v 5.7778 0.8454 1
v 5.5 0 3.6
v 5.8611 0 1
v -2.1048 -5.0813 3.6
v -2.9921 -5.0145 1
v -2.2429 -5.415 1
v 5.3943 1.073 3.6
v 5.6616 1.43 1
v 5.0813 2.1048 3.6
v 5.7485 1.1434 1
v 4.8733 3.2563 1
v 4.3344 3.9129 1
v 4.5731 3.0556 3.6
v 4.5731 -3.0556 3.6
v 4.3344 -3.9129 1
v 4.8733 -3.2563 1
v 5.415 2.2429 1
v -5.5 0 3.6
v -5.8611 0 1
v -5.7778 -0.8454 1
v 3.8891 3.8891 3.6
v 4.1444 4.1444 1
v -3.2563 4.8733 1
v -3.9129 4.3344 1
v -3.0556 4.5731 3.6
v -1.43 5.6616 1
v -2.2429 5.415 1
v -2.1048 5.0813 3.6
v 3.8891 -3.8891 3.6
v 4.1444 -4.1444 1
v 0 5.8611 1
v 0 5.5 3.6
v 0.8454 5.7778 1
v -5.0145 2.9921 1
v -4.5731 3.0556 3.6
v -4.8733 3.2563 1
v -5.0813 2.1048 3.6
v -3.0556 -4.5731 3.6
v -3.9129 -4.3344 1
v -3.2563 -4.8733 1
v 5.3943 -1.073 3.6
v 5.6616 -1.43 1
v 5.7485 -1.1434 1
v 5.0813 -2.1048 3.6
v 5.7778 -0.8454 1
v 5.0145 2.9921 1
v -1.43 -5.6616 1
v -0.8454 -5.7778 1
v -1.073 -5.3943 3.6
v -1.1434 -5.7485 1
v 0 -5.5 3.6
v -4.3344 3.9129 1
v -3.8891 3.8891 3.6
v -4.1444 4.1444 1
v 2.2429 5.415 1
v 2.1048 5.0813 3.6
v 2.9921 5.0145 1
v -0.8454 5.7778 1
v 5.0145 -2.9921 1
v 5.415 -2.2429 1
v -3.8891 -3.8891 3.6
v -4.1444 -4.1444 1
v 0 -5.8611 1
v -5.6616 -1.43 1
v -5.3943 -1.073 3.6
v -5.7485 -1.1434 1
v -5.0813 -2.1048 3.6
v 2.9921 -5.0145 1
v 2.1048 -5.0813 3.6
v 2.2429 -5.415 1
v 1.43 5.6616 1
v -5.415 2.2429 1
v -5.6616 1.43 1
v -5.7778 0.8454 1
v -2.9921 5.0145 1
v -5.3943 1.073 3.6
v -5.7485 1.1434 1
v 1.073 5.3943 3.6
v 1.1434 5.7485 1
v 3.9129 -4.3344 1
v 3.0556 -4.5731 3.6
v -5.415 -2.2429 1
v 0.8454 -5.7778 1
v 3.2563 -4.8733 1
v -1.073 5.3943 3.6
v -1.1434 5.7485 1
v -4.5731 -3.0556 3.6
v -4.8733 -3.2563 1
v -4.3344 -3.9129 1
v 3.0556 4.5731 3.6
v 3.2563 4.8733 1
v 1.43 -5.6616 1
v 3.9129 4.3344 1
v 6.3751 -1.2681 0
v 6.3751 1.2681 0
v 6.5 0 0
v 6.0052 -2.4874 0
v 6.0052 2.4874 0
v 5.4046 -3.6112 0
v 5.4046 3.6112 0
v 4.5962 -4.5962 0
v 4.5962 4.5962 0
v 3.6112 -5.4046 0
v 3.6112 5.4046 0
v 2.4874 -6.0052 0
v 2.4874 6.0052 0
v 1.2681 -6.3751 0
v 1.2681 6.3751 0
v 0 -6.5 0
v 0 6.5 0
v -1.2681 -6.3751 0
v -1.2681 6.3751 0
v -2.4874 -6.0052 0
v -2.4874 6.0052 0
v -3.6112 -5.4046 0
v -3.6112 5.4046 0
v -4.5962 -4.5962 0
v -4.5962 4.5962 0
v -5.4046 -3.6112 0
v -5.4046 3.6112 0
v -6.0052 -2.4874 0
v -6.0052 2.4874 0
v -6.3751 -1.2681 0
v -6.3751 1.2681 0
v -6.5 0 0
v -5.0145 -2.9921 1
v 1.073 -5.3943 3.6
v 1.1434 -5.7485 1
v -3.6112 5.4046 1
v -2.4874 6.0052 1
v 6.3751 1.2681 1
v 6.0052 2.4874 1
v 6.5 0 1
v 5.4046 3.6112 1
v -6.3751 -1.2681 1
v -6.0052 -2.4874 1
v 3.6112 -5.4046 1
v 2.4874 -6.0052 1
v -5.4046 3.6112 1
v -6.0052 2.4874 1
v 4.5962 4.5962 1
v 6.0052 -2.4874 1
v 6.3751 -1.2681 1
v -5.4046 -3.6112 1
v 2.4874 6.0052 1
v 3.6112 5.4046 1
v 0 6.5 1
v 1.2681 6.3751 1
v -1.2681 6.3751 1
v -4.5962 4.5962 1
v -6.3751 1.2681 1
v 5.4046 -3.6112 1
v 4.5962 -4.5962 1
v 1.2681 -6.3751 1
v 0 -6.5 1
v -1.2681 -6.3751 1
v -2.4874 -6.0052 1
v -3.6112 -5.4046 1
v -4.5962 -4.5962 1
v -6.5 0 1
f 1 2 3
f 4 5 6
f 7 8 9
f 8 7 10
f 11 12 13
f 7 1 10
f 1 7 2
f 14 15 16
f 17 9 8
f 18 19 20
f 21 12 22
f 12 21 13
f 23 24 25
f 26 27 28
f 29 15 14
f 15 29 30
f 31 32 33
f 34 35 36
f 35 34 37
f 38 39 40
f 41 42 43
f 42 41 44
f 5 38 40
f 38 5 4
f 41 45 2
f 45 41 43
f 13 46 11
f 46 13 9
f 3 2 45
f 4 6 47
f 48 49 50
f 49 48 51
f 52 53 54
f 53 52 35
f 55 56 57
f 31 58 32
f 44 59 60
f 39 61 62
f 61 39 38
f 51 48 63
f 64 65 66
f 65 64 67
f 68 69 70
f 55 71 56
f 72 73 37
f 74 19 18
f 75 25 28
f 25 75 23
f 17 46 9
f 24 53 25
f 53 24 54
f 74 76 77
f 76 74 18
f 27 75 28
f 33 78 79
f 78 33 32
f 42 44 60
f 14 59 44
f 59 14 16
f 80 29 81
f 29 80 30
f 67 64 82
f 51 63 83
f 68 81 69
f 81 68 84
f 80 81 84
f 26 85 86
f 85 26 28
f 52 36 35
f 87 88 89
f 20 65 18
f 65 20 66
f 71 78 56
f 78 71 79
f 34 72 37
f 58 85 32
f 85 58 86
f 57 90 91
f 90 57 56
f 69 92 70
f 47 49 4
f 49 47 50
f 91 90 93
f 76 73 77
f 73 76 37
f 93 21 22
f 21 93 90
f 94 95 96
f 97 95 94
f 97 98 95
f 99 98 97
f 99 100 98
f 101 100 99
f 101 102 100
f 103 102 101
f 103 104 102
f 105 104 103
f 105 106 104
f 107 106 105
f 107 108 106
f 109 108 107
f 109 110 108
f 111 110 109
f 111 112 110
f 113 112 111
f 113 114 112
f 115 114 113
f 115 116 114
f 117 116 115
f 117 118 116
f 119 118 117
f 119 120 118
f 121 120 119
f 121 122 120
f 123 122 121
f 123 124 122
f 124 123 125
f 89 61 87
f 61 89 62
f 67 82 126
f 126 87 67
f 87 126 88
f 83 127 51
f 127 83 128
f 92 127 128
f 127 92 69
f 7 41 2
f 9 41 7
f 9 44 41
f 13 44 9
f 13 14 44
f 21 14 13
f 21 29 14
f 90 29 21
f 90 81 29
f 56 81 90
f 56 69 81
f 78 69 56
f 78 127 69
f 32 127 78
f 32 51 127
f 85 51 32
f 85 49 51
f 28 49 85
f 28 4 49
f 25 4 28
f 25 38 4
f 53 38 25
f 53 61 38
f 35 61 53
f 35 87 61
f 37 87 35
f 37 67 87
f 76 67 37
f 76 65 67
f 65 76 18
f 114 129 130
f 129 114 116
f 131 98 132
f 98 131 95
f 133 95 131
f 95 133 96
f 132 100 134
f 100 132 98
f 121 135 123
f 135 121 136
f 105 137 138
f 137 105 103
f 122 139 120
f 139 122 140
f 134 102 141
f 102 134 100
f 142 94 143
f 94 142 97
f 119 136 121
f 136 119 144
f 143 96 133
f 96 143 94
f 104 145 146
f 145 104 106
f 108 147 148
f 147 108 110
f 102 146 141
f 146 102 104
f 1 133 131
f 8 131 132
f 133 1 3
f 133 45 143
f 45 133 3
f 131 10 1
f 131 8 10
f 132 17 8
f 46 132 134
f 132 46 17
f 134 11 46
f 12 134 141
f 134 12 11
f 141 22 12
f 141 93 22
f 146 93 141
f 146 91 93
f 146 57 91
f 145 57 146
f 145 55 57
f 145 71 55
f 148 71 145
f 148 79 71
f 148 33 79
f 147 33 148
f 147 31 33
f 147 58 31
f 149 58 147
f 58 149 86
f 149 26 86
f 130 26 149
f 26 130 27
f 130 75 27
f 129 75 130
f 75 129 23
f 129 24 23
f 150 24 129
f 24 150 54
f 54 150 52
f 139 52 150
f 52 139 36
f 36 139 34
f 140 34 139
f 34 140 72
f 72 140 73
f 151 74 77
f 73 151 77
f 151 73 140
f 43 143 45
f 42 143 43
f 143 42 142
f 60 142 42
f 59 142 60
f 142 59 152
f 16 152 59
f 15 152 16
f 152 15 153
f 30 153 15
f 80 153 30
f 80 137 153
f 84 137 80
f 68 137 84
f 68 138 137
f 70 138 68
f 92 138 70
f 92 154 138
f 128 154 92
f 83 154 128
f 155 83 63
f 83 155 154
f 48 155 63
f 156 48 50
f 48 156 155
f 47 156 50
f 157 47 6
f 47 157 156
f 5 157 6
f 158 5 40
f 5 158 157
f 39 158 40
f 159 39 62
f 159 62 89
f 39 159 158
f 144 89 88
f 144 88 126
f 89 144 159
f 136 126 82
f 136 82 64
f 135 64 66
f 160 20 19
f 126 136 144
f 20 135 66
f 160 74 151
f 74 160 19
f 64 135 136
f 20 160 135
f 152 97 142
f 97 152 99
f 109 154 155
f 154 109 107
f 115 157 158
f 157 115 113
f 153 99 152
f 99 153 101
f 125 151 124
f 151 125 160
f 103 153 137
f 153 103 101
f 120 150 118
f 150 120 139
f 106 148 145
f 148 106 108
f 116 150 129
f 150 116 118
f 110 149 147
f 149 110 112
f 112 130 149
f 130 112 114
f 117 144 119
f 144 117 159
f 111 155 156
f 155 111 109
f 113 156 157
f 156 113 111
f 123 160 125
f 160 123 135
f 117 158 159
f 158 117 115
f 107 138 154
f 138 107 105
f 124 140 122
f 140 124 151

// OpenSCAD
$fn=32;
D=12;
cylinder(h=3.6,
            d1=D,
            d2=D-1);
cylinder(h=1,
            d1=D+1,
            d2=D+1);
